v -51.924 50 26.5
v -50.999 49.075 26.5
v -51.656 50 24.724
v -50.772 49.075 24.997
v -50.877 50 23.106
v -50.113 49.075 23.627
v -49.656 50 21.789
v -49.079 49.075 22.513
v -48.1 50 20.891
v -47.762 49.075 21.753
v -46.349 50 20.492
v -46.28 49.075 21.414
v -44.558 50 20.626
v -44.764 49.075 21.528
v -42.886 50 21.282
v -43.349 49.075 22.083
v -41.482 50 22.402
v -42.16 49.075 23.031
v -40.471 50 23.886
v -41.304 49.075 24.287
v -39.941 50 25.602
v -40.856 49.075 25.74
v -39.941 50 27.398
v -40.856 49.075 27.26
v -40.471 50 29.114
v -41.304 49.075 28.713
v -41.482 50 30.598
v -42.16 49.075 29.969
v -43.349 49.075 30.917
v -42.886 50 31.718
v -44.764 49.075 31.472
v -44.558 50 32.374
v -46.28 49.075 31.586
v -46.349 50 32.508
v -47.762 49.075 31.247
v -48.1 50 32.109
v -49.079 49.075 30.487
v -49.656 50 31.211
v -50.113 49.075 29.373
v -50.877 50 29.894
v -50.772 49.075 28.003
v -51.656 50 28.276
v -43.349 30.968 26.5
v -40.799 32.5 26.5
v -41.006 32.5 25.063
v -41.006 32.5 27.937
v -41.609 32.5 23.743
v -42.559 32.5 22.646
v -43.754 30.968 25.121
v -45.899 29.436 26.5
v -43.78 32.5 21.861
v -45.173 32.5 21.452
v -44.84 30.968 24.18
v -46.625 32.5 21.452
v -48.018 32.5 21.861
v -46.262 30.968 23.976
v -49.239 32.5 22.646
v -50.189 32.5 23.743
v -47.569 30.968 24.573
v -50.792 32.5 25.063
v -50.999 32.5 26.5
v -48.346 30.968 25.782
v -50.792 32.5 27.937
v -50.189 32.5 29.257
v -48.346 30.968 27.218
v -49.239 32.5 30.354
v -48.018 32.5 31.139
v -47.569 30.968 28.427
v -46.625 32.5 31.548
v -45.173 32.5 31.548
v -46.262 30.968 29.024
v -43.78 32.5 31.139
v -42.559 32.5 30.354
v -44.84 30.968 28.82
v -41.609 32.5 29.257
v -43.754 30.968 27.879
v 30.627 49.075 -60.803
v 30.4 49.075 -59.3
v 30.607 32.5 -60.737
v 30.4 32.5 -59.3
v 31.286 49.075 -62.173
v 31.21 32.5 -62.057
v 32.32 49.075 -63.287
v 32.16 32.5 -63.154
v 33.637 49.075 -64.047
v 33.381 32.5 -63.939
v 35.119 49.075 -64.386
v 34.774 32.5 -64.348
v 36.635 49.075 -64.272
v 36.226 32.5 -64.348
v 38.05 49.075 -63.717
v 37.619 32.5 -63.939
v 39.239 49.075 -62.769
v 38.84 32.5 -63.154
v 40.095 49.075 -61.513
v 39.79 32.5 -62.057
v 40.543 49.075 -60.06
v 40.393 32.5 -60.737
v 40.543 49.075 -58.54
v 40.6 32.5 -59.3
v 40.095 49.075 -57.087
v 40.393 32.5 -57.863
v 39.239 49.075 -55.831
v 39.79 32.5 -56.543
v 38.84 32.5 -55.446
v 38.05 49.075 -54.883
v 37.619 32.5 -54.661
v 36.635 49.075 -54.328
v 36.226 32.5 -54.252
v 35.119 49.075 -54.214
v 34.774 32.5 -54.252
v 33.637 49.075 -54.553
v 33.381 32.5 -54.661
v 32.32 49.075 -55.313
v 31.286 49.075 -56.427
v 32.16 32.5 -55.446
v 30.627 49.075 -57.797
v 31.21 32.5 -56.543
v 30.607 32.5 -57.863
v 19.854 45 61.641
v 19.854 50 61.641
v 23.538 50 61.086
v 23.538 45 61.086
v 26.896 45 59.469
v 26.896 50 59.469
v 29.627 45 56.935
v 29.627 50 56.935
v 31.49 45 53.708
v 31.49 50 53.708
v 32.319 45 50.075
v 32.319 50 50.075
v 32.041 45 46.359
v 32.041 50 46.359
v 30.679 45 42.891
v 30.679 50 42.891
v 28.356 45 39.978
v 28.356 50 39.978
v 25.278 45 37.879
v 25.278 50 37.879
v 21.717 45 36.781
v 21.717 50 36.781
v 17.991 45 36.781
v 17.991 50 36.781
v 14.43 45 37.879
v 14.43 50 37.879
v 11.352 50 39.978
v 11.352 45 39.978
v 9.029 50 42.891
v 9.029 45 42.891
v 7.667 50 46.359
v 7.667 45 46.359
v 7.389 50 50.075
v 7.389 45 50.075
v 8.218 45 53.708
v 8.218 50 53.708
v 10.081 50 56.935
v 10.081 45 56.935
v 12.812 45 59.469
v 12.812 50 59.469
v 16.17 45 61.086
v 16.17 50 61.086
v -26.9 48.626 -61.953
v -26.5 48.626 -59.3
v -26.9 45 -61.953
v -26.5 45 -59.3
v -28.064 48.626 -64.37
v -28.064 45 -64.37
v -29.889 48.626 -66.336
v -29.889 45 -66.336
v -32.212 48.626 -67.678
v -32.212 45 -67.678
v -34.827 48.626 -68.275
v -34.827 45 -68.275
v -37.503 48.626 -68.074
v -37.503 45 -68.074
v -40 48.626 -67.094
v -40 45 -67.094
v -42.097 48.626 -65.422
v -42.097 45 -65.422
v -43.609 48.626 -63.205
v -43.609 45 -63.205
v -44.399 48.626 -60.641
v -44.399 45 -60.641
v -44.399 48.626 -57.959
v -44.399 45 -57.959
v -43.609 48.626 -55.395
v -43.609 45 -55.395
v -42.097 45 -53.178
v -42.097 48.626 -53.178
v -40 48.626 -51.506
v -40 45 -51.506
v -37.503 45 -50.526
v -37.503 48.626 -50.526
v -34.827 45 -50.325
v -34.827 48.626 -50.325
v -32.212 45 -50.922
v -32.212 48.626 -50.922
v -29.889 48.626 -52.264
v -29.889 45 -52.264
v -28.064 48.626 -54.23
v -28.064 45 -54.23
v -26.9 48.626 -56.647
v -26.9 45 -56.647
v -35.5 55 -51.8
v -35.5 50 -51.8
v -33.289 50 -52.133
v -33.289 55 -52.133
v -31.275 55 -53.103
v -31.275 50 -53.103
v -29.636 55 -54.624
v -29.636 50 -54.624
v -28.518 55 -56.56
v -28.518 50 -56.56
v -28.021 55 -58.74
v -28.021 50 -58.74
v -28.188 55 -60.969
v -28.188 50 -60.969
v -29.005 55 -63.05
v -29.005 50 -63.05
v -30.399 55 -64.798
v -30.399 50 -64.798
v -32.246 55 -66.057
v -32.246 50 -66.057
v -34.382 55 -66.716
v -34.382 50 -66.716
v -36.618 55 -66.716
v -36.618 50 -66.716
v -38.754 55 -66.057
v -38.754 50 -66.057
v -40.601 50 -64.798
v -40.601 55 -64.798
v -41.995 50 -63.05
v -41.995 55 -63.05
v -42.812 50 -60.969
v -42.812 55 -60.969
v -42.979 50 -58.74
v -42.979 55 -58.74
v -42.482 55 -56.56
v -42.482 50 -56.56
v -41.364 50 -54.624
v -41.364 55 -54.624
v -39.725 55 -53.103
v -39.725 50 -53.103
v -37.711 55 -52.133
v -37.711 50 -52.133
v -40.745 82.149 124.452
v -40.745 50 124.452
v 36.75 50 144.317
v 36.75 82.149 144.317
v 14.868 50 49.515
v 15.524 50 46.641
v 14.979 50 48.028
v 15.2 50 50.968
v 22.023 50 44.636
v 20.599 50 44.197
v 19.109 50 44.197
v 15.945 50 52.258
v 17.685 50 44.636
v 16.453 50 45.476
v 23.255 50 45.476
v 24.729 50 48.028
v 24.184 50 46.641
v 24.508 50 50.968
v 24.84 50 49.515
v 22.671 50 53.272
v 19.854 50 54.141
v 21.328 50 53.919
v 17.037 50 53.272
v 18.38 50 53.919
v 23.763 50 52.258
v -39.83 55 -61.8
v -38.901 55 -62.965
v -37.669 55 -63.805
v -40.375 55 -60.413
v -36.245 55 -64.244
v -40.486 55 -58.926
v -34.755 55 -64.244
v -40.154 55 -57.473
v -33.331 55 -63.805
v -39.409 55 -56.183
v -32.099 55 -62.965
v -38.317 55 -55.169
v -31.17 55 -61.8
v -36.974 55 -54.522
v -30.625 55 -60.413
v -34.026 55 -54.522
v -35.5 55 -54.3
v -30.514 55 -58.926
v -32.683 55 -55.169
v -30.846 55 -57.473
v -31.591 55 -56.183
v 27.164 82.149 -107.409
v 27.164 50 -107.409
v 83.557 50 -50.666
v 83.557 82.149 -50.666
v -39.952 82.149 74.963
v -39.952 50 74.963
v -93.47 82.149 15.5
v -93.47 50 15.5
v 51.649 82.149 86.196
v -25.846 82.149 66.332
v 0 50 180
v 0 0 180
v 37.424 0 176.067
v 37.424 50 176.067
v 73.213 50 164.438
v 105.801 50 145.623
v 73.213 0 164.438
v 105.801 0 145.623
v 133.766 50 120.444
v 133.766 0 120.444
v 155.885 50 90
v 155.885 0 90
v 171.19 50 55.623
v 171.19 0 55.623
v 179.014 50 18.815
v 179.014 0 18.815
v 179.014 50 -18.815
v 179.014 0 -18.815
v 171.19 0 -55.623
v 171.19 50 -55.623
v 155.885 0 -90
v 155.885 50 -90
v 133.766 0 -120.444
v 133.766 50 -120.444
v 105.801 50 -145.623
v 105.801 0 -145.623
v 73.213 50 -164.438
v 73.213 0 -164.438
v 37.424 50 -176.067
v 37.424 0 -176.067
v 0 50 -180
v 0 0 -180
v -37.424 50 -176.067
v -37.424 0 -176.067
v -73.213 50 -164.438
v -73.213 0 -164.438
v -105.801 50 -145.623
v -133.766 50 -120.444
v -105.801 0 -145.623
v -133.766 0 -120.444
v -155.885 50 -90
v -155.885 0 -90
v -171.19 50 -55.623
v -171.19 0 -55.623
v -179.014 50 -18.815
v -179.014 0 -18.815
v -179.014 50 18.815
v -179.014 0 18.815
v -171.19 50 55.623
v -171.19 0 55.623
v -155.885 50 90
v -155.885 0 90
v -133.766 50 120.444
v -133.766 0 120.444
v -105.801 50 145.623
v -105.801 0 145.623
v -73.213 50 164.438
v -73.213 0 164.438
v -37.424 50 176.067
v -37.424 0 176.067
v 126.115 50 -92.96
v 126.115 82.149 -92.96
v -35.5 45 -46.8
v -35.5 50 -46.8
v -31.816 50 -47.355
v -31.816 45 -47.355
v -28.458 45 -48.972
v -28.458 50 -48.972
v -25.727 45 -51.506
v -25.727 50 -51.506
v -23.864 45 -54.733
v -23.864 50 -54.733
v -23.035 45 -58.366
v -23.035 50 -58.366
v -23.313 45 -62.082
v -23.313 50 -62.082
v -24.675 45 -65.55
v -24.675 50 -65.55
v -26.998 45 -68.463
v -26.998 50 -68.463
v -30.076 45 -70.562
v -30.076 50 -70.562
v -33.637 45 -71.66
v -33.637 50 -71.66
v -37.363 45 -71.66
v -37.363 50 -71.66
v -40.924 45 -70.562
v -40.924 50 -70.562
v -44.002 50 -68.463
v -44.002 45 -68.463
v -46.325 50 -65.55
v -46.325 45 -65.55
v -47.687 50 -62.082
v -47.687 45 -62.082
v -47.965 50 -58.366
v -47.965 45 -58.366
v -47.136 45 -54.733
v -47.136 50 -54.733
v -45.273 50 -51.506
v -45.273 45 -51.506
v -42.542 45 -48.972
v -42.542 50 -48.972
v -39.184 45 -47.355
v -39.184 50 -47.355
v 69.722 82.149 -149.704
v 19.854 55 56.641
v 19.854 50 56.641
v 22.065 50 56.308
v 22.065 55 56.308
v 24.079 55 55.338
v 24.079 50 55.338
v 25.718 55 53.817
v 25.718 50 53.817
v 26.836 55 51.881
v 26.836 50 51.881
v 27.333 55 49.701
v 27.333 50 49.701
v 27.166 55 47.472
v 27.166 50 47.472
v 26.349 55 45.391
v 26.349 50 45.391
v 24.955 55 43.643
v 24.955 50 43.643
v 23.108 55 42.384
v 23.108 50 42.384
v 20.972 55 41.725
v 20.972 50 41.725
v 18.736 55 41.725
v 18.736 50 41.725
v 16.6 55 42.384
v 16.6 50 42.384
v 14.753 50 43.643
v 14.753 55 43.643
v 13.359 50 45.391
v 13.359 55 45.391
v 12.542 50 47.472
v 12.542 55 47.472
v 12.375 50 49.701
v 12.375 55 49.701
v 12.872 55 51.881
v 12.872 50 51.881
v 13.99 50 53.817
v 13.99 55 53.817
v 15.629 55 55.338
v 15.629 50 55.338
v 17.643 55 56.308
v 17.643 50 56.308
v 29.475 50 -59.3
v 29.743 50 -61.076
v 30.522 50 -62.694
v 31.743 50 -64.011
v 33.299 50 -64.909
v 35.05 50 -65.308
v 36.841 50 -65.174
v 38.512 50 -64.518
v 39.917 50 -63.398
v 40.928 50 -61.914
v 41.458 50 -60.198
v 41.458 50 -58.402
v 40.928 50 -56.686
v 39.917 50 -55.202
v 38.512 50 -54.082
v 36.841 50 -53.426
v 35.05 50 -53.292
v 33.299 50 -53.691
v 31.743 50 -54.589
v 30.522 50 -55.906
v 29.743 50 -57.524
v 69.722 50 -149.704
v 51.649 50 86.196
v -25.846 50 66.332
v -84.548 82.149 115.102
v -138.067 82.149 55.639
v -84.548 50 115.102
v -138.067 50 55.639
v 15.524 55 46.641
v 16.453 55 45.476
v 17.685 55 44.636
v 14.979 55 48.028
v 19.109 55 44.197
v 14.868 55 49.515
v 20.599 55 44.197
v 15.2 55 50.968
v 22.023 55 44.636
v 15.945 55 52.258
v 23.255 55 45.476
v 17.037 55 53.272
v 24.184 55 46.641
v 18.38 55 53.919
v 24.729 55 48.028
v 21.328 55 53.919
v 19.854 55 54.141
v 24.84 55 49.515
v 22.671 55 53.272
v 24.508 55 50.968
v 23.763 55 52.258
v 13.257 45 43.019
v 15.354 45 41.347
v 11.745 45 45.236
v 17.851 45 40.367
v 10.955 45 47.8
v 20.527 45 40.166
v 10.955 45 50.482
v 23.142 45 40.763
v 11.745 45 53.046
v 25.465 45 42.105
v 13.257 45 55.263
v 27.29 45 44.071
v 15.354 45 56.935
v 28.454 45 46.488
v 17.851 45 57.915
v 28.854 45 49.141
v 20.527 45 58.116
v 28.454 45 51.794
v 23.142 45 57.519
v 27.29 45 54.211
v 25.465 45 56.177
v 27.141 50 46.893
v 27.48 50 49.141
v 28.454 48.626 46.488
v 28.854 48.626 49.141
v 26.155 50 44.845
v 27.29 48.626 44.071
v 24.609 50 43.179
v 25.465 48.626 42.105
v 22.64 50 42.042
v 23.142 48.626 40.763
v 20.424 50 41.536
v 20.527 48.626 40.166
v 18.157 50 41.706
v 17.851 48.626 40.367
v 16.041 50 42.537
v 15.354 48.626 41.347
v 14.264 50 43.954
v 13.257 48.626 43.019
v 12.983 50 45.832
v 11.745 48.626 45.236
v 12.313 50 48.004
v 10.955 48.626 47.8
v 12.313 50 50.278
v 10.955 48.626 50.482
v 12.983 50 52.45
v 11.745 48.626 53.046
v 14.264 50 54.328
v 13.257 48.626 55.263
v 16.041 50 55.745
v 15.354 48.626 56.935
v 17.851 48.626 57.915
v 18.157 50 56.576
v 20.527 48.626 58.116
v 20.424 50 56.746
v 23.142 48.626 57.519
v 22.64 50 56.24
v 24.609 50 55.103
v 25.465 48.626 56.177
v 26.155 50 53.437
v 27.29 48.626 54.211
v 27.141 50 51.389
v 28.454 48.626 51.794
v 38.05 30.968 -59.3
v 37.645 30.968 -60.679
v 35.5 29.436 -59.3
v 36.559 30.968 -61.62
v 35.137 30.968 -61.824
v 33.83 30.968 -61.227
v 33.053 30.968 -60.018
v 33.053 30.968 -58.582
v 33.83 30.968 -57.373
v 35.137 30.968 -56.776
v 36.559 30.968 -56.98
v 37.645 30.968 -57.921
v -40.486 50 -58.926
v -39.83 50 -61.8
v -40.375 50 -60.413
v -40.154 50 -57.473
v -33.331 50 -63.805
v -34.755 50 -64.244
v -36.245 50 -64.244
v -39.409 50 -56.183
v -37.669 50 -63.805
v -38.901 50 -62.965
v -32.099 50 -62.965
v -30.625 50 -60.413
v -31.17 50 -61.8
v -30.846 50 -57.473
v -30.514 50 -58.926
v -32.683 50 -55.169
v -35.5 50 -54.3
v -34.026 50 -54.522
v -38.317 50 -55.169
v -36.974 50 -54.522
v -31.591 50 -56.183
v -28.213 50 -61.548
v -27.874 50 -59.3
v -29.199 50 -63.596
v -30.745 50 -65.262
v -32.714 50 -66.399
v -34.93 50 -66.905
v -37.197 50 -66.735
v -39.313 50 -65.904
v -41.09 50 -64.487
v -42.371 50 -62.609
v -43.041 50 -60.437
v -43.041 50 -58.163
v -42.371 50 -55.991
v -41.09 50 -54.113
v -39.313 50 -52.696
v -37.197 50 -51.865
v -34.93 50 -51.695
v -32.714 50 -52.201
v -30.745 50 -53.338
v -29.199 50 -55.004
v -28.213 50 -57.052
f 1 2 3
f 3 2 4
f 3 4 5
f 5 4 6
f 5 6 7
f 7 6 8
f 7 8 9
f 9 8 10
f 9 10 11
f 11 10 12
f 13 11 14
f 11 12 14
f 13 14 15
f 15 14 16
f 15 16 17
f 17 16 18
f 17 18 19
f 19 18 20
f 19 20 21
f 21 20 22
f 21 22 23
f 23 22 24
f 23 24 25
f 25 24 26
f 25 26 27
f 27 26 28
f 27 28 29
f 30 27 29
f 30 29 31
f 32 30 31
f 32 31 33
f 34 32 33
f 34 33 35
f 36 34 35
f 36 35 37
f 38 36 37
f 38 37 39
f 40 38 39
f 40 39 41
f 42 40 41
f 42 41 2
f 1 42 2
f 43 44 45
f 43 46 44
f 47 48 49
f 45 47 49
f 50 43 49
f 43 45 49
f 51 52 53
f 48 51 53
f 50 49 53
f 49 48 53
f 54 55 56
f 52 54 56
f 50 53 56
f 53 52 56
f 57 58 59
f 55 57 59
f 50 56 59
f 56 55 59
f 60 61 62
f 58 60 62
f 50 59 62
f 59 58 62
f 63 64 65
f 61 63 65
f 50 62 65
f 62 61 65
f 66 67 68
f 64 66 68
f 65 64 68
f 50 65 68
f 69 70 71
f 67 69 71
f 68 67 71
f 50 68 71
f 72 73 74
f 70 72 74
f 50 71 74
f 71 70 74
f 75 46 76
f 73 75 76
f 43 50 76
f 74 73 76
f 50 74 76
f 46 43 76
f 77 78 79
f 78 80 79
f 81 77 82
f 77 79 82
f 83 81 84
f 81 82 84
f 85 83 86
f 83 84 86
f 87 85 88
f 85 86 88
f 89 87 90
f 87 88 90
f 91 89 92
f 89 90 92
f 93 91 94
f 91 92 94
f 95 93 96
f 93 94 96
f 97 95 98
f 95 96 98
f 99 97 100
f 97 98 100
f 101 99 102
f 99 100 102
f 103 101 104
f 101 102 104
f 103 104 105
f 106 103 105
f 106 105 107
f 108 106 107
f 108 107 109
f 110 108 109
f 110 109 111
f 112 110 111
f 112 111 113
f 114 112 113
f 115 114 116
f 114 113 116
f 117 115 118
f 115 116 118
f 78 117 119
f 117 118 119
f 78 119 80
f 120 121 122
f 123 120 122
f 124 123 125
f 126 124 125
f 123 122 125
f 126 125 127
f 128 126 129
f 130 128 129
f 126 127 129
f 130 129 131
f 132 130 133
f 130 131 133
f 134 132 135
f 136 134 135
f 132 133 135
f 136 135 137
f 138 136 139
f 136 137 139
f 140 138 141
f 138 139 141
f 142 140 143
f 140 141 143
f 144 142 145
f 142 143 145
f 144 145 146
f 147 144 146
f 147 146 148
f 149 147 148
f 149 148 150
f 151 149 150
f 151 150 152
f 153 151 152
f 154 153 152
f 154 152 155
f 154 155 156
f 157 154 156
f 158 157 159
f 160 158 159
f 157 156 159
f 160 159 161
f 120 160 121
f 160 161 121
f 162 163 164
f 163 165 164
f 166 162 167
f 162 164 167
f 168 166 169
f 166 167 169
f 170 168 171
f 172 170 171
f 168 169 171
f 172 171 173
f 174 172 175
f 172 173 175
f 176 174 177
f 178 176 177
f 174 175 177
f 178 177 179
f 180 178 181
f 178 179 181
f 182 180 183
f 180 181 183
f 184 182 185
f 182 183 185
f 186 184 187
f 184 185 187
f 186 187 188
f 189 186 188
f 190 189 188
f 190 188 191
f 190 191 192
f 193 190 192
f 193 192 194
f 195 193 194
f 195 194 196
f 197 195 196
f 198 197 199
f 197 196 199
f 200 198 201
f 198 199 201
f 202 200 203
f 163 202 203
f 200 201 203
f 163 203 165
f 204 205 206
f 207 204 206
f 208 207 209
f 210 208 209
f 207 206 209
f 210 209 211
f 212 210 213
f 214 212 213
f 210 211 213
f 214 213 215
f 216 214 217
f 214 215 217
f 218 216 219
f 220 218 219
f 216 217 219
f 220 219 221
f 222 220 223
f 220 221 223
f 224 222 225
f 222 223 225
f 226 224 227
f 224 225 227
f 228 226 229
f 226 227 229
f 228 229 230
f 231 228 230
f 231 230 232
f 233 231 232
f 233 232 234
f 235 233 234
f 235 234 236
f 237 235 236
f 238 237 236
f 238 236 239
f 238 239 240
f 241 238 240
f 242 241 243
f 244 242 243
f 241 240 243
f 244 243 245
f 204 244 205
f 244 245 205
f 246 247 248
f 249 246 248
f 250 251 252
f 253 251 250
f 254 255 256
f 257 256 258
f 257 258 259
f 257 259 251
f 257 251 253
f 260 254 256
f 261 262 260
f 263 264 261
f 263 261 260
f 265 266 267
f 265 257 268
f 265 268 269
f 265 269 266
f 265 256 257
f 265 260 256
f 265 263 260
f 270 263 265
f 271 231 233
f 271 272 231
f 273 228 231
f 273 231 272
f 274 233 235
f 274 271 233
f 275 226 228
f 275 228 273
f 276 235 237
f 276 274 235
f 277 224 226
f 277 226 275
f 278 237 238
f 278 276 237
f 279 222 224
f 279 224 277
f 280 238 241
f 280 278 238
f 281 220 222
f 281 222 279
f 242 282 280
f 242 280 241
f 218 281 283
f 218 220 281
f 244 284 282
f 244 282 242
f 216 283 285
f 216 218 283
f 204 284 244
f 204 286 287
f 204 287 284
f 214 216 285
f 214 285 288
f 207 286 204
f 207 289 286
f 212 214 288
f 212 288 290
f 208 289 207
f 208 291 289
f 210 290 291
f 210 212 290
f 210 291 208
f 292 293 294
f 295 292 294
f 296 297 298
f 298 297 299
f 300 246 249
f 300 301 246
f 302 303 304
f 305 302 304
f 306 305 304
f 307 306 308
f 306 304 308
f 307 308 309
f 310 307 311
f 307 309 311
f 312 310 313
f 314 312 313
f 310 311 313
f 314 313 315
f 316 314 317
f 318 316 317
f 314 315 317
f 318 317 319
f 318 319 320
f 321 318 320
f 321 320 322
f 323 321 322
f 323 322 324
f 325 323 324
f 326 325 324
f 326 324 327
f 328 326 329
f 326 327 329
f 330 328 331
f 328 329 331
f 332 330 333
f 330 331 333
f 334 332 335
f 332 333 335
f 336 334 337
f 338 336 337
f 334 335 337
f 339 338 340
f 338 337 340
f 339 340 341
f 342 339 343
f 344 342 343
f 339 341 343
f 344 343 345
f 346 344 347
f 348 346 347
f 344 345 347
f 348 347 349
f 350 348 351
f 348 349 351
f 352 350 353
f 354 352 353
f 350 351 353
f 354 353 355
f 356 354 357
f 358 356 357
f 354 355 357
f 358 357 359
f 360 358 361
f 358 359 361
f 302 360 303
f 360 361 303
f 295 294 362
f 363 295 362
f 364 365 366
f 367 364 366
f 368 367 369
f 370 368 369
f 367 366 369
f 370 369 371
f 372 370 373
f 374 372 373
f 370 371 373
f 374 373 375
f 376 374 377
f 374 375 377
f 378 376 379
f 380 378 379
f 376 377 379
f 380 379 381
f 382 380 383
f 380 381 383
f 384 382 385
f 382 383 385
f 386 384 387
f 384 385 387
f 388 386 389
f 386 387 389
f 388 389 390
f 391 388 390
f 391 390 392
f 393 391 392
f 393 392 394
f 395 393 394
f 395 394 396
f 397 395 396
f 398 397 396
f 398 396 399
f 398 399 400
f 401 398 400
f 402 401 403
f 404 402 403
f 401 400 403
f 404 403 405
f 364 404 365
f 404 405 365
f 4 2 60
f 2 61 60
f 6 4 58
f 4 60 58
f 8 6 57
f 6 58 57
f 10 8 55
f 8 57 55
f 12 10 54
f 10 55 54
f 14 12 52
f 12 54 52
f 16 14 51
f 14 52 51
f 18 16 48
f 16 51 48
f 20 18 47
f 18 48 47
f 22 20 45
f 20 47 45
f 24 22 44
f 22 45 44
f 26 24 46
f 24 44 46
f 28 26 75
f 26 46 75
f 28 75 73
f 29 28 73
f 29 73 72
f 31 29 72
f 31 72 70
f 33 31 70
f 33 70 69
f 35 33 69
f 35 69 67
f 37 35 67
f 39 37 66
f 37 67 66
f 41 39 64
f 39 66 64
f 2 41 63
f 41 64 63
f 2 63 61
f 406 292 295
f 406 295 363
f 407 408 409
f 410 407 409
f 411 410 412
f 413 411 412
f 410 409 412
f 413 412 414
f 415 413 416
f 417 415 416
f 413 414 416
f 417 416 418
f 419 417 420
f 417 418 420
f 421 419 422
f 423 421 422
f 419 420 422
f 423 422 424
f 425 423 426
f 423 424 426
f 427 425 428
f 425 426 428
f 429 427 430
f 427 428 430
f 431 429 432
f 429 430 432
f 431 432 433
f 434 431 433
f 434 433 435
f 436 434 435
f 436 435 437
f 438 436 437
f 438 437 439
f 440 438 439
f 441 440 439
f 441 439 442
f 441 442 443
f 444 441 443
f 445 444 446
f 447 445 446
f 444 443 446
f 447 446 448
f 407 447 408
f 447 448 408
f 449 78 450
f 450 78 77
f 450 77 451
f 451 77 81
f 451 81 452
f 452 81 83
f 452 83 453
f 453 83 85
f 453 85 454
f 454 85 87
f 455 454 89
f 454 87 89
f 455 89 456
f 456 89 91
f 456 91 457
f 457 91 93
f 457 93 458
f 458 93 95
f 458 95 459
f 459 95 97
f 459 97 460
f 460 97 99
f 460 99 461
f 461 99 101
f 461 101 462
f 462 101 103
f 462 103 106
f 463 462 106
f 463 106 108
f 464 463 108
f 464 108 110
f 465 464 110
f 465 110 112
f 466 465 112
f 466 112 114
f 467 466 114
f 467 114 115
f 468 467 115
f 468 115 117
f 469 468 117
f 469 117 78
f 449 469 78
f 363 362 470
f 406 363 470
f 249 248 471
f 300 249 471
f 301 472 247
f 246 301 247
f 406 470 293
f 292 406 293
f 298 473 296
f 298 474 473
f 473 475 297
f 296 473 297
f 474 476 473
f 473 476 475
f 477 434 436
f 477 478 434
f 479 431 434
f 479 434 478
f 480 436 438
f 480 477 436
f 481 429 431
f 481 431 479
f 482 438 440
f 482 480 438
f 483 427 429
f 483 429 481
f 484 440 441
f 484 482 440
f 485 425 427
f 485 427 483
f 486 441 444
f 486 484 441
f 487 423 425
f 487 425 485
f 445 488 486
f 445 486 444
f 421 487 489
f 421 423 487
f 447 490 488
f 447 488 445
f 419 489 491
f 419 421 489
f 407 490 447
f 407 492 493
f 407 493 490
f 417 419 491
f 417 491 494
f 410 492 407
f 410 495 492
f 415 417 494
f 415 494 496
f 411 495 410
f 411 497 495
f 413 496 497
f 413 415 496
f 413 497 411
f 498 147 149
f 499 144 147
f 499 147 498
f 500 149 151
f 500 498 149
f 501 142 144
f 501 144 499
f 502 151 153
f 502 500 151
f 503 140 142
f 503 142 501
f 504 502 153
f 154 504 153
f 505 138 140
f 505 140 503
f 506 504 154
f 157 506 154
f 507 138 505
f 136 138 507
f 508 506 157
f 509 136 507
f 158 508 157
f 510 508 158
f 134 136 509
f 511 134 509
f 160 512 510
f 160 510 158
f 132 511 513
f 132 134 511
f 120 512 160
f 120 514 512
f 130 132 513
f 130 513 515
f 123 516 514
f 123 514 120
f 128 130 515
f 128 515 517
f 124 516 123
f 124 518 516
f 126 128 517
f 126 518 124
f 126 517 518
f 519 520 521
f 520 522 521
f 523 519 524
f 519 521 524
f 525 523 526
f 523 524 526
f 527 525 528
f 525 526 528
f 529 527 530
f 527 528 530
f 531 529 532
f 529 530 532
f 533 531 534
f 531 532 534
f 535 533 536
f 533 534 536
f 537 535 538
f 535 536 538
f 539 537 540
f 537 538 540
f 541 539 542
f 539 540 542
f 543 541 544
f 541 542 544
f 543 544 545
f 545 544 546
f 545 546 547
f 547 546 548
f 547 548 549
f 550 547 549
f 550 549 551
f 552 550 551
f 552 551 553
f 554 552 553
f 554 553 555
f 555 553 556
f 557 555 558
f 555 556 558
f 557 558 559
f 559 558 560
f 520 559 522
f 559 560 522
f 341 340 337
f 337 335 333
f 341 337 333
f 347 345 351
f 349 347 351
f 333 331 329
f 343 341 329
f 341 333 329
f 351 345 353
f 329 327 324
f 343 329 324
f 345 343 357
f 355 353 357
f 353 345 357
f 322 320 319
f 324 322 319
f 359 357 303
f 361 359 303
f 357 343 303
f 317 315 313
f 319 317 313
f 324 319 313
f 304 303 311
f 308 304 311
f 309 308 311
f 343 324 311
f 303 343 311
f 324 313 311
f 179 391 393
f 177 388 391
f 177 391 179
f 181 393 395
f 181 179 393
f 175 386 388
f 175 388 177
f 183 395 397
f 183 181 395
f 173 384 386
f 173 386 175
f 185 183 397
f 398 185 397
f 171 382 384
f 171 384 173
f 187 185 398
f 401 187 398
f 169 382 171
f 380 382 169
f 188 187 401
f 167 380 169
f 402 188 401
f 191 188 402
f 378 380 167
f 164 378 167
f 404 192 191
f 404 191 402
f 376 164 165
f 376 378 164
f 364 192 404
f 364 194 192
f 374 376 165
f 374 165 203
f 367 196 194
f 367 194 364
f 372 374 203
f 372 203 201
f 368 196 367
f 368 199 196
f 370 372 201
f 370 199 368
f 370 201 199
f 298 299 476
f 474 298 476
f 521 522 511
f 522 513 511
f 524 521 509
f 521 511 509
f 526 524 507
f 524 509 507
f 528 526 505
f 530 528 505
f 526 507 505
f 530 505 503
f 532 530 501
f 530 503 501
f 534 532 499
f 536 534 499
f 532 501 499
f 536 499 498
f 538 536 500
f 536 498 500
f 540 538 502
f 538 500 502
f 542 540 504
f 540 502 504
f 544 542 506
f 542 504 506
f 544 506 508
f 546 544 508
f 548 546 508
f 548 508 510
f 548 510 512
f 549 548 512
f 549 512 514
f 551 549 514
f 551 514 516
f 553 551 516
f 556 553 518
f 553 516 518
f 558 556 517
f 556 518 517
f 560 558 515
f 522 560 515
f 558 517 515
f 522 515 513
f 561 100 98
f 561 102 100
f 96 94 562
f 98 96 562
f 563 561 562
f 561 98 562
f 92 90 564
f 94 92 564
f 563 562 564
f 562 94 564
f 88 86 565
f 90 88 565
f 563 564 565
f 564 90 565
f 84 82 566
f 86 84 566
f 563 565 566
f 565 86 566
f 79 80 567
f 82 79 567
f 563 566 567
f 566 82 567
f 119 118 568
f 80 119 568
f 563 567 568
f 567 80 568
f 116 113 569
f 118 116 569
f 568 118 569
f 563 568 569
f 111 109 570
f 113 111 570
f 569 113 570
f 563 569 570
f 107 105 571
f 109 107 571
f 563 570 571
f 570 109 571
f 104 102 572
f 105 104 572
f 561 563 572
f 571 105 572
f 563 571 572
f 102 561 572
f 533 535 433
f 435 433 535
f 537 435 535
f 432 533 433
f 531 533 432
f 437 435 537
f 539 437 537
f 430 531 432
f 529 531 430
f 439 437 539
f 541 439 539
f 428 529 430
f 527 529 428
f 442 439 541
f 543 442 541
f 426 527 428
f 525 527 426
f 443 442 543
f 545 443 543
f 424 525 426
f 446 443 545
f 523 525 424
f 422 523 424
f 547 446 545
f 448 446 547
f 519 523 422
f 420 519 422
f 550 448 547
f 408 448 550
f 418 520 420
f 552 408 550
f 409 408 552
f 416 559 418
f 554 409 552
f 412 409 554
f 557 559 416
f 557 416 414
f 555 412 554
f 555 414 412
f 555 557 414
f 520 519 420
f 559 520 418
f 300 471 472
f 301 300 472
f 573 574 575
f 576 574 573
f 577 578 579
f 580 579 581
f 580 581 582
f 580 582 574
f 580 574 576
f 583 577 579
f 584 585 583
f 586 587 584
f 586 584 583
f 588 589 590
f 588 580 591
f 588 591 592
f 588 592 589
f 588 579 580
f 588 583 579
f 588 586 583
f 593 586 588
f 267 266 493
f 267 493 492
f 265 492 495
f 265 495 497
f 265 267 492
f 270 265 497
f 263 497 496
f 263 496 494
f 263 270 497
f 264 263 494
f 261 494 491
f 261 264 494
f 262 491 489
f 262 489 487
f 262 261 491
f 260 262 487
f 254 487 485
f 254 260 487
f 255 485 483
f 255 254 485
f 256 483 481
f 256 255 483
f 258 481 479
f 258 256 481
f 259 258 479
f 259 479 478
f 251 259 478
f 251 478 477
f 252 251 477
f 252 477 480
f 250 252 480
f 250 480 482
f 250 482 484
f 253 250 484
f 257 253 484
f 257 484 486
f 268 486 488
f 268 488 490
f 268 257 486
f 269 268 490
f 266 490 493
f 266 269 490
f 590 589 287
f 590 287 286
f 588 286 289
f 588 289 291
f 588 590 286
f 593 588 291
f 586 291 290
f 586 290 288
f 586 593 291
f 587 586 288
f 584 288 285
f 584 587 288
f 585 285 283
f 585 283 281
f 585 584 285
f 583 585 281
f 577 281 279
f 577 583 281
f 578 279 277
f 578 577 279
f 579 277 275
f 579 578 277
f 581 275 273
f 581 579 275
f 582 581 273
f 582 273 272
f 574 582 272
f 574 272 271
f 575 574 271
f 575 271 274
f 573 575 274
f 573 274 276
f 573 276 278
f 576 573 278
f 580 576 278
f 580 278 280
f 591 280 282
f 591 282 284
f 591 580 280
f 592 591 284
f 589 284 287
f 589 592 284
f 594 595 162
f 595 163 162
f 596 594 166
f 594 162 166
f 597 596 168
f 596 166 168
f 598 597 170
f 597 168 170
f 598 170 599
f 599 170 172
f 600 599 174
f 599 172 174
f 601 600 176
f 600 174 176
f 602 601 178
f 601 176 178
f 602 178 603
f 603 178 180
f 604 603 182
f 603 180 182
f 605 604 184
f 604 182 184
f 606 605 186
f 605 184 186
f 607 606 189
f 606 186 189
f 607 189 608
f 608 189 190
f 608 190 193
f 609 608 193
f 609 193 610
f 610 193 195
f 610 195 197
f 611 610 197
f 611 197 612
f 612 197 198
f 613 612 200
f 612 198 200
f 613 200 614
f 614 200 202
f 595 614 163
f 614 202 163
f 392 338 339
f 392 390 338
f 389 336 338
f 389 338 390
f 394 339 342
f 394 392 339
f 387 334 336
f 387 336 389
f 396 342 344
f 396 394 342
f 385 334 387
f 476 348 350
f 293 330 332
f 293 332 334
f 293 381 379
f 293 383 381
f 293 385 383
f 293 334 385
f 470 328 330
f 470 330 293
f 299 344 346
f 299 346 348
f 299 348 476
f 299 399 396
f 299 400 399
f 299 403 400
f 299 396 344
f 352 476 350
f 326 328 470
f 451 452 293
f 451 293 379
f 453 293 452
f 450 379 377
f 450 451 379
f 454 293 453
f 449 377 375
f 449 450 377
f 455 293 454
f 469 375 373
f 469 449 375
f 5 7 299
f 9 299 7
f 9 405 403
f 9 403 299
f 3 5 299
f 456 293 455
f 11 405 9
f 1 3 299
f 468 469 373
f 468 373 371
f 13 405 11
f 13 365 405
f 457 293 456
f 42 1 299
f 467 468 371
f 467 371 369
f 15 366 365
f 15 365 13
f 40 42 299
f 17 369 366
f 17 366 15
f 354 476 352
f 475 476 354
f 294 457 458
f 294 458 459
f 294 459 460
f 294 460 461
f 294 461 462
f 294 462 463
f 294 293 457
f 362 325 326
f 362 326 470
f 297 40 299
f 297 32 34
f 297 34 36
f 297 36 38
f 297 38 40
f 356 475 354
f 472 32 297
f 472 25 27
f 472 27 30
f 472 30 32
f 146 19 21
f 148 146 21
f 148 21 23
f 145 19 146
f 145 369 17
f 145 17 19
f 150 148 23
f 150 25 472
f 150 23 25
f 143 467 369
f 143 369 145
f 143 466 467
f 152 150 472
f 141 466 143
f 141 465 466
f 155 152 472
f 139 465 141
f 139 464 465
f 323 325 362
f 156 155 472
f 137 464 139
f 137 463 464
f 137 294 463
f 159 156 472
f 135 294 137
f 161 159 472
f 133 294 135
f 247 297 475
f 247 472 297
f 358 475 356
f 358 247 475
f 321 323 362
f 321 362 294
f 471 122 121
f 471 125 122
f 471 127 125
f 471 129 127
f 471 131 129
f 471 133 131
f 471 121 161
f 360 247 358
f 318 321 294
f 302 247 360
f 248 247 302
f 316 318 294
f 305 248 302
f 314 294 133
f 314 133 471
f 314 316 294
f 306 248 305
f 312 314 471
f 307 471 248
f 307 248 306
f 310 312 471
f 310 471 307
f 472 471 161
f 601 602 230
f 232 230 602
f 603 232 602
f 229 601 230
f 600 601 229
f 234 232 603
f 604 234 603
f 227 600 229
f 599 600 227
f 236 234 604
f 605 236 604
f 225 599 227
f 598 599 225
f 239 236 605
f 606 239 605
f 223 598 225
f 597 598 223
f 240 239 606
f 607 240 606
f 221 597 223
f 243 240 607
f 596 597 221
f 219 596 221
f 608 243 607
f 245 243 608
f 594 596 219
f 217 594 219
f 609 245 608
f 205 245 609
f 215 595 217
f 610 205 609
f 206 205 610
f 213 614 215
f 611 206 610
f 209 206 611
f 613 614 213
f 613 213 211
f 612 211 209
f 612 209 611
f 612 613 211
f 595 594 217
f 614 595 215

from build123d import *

# Parameters (mm, degrees)
SKETCH1_R                    = 180
BOSS_EXTRUDE1_DEPTH          = 50
BOSS_EXTRUDE2_DEPTH          = 32.148542
SKETCH3_R                    = 12.5
CUT_EXTRUDE1_DEPTH           = 5
M12_TAPPED_HOLE1_D           = 10.2
M12_TAPPED_HOLE1_DEPTH       = 17.5
M12_TAPPED_HOLE1_CSINK_D     = 12.05
M12_TAPPED_HOLE1_CSINK_ANGLE = 90
M12_TAPPED_HOLE1_TIP         = 3.064389157
SKETCH8_R                    = 10
BOSS_EXTRUDE3_DEPTH          = 5
SKETCH9_R                    = 7.5
SKETCH9_R_2                  = 5
BOSS_EXTRUDE4_DEPTH          = 5


# Read off the part's stored shape, not the designer's step: M18 Machine Threads Stud1, M18 Machine Threads Stud2
with BuildPart() as part:
    # Sketch1 → Boss-Extrude1 (new body)
    with BuildSketch(Plane(origin=(0, 0, 0), x_dir=(1, 0, 0), z_dir=(0, 1, 0))):
        with Locations(Location((0, 0, 0), (0, 0, 270))):
            Circle(SKETCH1_R)
    extrude(amount=BOSS_EXTRUDE1_DEPTH)

    # Sketch2 → Boss-Extrude2 (add)
    with BuildSketch(Plane(origin=(0, 50, 0), x_dir=(1, 0, 0), z_dir=(0, 1, 0))):
        Polygon((-84.548207039, -115.101573323), (-39.951504434, -74.962638151), (-93.470084664, -15.500368011), (-138.066787269, -55.639303183), align=None)
        Polygon((-40.744531967, -124.452472721), (36.749910483, -144.317300669), (51.648531443, -86.196468831), (-25.845911006, -66.331640884), align=None)
        Polygon((126.114531486, 92.960164639), (69.721759674, 149.703933348), (27.163933142, 107.409354489), (83.556704954, 50.66558578), align=None)
    extrude(amount=BOSS_EXTRUDE2_DEPTH)

    # Sketch3 → Cut-Extrude1 (cut)
    with BuildSketch(Plane(origin=(0, 50, 0), x_dir=(1, 0, 0), z_dir=(0, 1, 0))):
        with Locations(Location((-35.5, 59.3, 0), (0, 0, 270))):
            Circle(SKETCH3_R)
        with Locations(Location((19.854, -49.141, 0), (0, 0, 270))):
            Circle(SKETCH3_R)
    extrude(amount=-CUT_EXTRUDE1_DEPTH, mode=Mode.SUBTRACT)

    # M12 Tapped Hole1
    with Locations(Plane(origin=(0, 50, 0), x_dir=(1, 0, 0), z_dir=(0, 1, 0))):
        with Locations((35.5, 59.3), (-45.899, -26.5)):
            CounterSinkHole(M12_TAPPED_HOLE1_D / 2, M12_TAPPED_HOLE1_CSINK_D / 2, depth=M12_TAPPED_HOLE1_DEPTH, counter_sink_angle=M12_TAPPED_HOLE1_CSINK_ANGLE)
            with Locations((0, 0, -(M12_TAPPED_HOLE1_DEPTH + M12_TAPPED_HOLE1_TIP / 2))):  # 118° drill point
                Cone(0, M12_TAPPED_HOLE1_D / 2, M12_TAPPED_HOLE1_TIP, mode=Mode.SUBTRACT)

    # Sketch8 → Boss-Extrude3 (add)
    with BuildSketch(Plane(origin=(0, 45, 0), x_dir=(1, 0, 0), z_dir=(0, 1, 0))):
        with Locations(Location((-35.5, 59.3, 0), (0, 0, 270))):
            Circle(SKETCH8_R)
        with Locations(Location((19.854, -49.141, 0), (0, 0, 270))):
            Circle(SKETCH8_R)
    extrude(amount=BOSS_EXTRUDE3_DEPTH)

    # Sketch9 → Boss-Extrude4 (add)
    # profile 1 of 2: a face of its own
    with BuildSketch(Plane(origin=(0, 50, 0), x_dir=(1, 0, 0), z_dir=(0, 1, 0))):
        with Locations(Location((-35.5, 59.3, 0), (0, 0, 270))):
            Circle(SKETCH9_R)
        with Locations(Location((-35.5, 59.3, 0), (0, 0, 270))):
            Circle(SKETCH9_R_2, mode=Mode.SUBTRACT)
    # profile 2 of 2: a face of its own
    with BuildSketch(Plane(origin=(0, 50, 0), x_dir=(1, 0, 0), z_dir=(0, 1, 0))):
        with Locations(Location((19.854, -49.141, 0), (0, 0, 270))):
            Circle(SKETCH9_R)
        with Locations(Location((19.854, -49.141, 0), (0, 0, 270))):
            Circle(SKETCH9_R_2, mode=Mode.SUBTRACT)
    extrude(amount=BOSS_EXTRUDE4_DEPTH)

    # M18 Machine Threads Stud1 outline → M18 Machine Threads Stud1 (revolve, cut)
    with BuildSketch(Plane(origin=(-35.5, 0, -59.3), x_dir=(1, 0, 0), z_dir=(0, 0, 1))):
        Polygon((9, 48.626), (9, 45), (10, 45), (10, 50), (7.626, 50), align=None)
    revolve(axis=Axis((-35.5, 0, -59.3), (0, 1, 0)), mode=Mode.SUBTRACT)

    # M18 Machine Threads Stud2 outline → M18 Machine Threads Stud2 (revolve, cut)
    with BuildSketch(Plane(origin=(19.854, 0, 49.141), x_dir=(1, 0, 0), z_dir=(0, 0, 1))):
        Polygon((9, 48.626), (9, 45), (10, 45), (10, 50), (7.626, 50), align=None)
    revolve(axis=Axis((19.854, 0, 49.141), (0, 1, 0)), mode=Mode.SUBTRACT)


solid = part.part
